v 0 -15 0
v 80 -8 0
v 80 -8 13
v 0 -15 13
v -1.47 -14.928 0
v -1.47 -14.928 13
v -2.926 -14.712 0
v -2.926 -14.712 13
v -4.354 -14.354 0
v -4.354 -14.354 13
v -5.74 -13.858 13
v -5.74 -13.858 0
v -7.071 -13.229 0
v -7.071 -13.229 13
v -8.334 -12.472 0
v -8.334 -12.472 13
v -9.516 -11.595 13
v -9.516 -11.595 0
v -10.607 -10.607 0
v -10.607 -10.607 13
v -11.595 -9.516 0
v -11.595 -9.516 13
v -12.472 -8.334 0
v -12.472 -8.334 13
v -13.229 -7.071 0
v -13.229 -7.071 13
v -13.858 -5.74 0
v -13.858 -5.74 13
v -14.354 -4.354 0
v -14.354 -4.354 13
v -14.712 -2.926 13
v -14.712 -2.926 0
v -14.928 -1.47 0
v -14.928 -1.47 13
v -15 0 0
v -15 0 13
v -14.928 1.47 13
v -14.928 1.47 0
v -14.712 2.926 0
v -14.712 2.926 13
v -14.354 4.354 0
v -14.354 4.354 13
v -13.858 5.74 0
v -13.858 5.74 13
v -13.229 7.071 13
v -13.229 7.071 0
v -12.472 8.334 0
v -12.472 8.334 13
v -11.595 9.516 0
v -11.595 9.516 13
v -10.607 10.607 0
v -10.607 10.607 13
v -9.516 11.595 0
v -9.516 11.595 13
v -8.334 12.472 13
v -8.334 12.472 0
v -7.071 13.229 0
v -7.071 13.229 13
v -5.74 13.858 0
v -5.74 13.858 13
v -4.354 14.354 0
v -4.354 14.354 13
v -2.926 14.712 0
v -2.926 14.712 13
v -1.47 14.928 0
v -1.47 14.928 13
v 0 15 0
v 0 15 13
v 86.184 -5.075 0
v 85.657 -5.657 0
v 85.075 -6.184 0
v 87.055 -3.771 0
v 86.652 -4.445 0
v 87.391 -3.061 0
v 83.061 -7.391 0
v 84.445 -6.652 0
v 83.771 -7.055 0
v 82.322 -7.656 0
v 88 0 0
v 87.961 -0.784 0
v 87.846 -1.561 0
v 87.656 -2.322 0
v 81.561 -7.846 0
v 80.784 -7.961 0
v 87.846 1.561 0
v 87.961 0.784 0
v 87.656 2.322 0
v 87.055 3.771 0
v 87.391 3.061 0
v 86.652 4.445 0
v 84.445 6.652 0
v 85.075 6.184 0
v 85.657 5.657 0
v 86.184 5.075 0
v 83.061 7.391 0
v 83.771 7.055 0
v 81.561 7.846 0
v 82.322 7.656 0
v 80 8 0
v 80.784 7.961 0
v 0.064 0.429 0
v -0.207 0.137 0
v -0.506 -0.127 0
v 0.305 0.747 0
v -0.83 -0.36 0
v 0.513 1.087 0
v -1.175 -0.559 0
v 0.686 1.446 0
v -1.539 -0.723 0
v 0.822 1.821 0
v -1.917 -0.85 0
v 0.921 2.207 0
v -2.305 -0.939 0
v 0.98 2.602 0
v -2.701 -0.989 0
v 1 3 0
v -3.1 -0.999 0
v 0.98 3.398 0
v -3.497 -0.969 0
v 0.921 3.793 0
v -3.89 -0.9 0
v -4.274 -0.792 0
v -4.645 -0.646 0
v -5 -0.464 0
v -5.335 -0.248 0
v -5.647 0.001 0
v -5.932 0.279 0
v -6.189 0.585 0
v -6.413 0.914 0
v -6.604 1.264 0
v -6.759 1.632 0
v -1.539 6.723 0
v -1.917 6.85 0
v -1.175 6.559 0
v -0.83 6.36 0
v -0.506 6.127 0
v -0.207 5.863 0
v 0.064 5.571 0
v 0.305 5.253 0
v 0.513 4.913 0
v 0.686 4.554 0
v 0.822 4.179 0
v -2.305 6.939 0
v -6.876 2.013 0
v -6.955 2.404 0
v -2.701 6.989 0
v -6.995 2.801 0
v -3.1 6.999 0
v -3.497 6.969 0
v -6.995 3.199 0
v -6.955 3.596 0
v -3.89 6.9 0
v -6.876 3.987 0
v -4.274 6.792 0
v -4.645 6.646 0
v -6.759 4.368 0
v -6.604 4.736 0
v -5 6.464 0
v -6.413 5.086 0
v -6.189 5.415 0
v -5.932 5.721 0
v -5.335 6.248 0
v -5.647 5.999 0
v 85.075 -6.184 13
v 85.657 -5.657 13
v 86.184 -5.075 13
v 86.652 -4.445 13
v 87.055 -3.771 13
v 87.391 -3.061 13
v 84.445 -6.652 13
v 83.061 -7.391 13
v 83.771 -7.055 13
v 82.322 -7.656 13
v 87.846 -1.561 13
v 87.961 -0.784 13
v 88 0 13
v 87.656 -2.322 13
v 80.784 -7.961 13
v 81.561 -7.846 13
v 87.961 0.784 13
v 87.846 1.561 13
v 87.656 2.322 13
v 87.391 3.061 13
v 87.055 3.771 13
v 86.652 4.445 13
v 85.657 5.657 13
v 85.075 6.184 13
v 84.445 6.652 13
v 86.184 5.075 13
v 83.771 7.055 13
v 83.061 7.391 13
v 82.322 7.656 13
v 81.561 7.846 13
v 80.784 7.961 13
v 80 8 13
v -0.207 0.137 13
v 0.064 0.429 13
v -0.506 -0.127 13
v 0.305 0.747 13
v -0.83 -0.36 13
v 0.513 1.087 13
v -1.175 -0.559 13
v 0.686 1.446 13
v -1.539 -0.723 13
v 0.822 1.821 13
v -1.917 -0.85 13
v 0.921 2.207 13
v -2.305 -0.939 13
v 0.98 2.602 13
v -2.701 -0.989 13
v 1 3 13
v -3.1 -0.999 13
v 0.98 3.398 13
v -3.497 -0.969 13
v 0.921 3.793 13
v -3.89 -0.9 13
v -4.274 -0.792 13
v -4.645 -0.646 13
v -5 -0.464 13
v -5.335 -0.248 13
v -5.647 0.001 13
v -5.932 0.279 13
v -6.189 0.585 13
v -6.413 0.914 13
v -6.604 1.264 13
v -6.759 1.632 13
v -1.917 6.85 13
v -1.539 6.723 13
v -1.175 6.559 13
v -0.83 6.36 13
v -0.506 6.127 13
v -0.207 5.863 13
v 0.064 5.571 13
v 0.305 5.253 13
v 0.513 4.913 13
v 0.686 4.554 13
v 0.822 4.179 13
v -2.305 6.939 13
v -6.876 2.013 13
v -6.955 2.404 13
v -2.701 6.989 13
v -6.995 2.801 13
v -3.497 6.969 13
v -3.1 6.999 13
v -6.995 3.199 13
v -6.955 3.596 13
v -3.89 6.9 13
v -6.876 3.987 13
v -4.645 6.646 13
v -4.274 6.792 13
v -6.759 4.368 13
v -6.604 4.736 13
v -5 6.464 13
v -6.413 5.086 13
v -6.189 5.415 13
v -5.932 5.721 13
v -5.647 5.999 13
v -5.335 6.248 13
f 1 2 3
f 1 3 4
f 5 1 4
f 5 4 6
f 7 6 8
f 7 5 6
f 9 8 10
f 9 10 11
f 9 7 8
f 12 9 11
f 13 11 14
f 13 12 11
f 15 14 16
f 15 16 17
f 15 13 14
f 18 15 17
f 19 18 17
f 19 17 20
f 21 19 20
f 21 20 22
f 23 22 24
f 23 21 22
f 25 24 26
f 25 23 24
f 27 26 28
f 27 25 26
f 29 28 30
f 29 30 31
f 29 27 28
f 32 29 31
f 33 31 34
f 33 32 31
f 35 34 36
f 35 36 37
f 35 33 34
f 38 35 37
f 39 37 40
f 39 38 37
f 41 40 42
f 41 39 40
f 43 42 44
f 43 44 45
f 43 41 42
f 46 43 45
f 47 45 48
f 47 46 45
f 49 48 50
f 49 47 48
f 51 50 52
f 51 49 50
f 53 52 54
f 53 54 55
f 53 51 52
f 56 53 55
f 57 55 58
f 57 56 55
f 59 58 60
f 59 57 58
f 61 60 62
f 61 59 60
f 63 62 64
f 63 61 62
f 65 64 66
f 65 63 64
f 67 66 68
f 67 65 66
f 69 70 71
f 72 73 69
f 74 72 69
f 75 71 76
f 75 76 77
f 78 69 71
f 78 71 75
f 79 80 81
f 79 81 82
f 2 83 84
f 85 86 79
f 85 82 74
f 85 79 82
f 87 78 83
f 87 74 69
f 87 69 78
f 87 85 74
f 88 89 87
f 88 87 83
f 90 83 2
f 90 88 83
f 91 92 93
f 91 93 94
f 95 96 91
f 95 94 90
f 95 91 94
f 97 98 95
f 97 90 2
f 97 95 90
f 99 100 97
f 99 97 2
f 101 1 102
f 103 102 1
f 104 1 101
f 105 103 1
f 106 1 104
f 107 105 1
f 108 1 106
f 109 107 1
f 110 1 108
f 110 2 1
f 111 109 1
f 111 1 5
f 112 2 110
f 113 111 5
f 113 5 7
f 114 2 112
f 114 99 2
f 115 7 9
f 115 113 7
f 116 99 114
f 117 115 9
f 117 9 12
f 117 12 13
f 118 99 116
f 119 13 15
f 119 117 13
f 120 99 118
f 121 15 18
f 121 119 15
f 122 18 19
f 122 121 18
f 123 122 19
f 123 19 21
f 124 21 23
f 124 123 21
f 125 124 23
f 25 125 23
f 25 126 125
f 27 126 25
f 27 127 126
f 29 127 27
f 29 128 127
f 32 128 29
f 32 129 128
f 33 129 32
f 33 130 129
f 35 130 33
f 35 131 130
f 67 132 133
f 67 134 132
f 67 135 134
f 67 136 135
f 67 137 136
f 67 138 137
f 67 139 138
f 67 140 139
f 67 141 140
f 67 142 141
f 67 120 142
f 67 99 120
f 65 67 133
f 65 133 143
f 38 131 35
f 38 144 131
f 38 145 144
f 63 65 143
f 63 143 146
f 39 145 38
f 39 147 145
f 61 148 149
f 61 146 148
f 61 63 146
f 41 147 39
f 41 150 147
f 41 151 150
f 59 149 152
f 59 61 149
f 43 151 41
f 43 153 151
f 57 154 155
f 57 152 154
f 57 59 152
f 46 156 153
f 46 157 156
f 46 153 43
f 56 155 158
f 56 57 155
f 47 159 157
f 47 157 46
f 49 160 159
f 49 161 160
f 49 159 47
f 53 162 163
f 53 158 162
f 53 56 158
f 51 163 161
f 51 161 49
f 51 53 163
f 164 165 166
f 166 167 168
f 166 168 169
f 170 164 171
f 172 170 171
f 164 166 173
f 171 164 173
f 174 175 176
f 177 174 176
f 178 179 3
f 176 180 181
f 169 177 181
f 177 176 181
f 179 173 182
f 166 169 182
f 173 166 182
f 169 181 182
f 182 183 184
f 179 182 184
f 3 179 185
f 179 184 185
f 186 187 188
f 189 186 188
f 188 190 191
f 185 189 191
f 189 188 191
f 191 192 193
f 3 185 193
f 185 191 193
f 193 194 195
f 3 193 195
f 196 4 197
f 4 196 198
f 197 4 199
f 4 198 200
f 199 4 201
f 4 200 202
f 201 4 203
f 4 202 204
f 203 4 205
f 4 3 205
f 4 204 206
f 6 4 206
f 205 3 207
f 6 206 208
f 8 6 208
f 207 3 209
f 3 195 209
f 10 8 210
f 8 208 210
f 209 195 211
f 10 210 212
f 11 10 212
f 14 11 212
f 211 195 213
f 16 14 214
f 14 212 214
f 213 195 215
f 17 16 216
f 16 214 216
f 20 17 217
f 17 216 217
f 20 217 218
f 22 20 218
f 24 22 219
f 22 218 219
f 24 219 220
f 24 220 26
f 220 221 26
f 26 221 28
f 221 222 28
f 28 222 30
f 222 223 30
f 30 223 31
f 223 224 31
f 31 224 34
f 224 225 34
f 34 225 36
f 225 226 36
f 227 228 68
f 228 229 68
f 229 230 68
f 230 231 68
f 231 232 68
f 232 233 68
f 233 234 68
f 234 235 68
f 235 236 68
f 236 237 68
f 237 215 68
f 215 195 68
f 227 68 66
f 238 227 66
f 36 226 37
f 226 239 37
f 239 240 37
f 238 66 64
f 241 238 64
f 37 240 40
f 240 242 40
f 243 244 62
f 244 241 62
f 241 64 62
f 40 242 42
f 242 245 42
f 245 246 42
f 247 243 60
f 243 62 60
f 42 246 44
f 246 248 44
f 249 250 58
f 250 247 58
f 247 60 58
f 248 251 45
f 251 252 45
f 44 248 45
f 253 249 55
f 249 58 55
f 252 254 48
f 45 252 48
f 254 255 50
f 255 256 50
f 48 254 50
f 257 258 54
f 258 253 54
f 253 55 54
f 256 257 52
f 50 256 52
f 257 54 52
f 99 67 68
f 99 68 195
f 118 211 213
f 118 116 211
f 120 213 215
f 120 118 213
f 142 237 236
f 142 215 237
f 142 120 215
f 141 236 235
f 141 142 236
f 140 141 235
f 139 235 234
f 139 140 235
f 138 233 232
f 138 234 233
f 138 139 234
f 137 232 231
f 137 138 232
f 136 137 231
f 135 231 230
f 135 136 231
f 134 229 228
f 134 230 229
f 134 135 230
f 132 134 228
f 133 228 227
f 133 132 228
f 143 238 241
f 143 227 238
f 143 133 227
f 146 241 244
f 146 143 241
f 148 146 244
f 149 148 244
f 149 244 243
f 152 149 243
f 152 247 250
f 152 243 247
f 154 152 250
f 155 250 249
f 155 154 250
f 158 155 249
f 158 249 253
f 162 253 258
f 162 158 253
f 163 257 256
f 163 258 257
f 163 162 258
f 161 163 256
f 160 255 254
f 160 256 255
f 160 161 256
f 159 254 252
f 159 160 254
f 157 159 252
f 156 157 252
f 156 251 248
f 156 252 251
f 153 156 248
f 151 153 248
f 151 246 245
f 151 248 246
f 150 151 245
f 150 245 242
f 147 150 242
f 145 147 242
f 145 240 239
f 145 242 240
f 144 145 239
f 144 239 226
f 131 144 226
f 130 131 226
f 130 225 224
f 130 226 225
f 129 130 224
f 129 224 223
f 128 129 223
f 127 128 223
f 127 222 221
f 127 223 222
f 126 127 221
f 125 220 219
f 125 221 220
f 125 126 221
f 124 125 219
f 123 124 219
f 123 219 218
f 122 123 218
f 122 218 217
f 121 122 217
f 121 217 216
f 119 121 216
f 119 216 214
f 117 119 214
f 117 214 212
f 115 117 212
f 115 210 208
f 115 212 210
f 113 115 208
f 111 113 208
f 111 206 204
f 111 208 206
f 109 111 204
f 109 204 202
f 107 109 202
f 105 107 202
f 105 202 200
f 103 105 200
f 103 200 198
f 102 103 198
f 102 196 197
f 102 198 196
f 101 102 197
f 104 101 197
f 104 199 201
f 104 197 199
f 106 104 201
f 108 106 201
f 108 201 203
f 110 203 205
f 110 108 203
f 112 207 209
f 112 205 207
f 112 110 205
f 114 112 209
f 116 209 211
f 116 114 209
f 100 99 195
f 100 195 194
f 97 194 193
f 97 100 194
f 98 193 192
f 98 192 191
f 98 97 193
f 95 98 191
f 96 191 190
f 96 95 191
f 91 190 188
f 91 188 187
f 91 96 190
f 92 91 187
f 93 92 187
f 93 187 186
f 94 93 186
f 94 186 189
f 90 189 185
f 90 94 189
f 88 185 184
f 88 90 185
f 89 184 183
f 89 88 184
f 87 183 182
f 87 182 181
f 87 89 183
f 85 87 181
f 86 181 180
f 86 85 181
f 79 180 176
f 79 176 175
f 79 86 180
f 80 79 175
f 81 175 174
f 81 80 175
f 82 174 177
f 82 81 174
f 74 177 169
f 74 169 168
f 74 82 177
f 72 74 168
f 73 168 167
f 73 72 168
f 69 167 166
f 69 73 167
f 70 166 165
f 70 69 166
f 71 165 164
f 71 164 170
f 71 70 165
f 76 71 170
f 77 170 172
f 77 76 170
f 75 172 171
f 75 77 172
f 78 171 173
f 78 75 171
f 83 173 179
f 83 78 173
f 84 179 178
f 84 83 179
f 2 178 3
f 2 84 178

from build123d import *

# Parameters (mm, degrees)
BOSS_EXTRU_1_DEPTH           = 13
ENL_V_MAT_EXTRU_1_DEPTH      = 91.210864091
ENL_V_MAT_EXTRU_1_DEPTH_BACK = 91.210864091
ESQUISSE2_R                  = 4


with BuildPart() as part:
    # Esquisse1 → Boss.-Extru.1 (new body)
    with BuildSketch(Plane.XY):
        with BuildLine():
            Line((0, 15), (80, 8))
            ThreePointArc((80, 8), (88, 0), (80, -8))
            Line((80, -8), (0, -15))
            ThreePointArc((0, -15), (-15, 0), (0, 15))
        make_face()
    extrude(amount=BOSS_EXTRU_1_DEPTH)

    # Esquisse2 → Enlèv. mat.-Extru.1 (cut, two sides: drawn at the far end of the back side and taken through both)
    with BuildSketch(Plane.XY.offset(13).offset(-ENL_V_MAT_EXTRU_1_DEPTH_BACK)):
        with Locations((-3, 3)):
            Circle(ESQUISSE2_R)
    extrude(amount=ENL_V_MAT_EXTRU_1_DEPTH + ENL_V_MAT_EXTRU_1_DEPTH_BACK, mode=Mode.SUBTRACT)


solid = part.part
